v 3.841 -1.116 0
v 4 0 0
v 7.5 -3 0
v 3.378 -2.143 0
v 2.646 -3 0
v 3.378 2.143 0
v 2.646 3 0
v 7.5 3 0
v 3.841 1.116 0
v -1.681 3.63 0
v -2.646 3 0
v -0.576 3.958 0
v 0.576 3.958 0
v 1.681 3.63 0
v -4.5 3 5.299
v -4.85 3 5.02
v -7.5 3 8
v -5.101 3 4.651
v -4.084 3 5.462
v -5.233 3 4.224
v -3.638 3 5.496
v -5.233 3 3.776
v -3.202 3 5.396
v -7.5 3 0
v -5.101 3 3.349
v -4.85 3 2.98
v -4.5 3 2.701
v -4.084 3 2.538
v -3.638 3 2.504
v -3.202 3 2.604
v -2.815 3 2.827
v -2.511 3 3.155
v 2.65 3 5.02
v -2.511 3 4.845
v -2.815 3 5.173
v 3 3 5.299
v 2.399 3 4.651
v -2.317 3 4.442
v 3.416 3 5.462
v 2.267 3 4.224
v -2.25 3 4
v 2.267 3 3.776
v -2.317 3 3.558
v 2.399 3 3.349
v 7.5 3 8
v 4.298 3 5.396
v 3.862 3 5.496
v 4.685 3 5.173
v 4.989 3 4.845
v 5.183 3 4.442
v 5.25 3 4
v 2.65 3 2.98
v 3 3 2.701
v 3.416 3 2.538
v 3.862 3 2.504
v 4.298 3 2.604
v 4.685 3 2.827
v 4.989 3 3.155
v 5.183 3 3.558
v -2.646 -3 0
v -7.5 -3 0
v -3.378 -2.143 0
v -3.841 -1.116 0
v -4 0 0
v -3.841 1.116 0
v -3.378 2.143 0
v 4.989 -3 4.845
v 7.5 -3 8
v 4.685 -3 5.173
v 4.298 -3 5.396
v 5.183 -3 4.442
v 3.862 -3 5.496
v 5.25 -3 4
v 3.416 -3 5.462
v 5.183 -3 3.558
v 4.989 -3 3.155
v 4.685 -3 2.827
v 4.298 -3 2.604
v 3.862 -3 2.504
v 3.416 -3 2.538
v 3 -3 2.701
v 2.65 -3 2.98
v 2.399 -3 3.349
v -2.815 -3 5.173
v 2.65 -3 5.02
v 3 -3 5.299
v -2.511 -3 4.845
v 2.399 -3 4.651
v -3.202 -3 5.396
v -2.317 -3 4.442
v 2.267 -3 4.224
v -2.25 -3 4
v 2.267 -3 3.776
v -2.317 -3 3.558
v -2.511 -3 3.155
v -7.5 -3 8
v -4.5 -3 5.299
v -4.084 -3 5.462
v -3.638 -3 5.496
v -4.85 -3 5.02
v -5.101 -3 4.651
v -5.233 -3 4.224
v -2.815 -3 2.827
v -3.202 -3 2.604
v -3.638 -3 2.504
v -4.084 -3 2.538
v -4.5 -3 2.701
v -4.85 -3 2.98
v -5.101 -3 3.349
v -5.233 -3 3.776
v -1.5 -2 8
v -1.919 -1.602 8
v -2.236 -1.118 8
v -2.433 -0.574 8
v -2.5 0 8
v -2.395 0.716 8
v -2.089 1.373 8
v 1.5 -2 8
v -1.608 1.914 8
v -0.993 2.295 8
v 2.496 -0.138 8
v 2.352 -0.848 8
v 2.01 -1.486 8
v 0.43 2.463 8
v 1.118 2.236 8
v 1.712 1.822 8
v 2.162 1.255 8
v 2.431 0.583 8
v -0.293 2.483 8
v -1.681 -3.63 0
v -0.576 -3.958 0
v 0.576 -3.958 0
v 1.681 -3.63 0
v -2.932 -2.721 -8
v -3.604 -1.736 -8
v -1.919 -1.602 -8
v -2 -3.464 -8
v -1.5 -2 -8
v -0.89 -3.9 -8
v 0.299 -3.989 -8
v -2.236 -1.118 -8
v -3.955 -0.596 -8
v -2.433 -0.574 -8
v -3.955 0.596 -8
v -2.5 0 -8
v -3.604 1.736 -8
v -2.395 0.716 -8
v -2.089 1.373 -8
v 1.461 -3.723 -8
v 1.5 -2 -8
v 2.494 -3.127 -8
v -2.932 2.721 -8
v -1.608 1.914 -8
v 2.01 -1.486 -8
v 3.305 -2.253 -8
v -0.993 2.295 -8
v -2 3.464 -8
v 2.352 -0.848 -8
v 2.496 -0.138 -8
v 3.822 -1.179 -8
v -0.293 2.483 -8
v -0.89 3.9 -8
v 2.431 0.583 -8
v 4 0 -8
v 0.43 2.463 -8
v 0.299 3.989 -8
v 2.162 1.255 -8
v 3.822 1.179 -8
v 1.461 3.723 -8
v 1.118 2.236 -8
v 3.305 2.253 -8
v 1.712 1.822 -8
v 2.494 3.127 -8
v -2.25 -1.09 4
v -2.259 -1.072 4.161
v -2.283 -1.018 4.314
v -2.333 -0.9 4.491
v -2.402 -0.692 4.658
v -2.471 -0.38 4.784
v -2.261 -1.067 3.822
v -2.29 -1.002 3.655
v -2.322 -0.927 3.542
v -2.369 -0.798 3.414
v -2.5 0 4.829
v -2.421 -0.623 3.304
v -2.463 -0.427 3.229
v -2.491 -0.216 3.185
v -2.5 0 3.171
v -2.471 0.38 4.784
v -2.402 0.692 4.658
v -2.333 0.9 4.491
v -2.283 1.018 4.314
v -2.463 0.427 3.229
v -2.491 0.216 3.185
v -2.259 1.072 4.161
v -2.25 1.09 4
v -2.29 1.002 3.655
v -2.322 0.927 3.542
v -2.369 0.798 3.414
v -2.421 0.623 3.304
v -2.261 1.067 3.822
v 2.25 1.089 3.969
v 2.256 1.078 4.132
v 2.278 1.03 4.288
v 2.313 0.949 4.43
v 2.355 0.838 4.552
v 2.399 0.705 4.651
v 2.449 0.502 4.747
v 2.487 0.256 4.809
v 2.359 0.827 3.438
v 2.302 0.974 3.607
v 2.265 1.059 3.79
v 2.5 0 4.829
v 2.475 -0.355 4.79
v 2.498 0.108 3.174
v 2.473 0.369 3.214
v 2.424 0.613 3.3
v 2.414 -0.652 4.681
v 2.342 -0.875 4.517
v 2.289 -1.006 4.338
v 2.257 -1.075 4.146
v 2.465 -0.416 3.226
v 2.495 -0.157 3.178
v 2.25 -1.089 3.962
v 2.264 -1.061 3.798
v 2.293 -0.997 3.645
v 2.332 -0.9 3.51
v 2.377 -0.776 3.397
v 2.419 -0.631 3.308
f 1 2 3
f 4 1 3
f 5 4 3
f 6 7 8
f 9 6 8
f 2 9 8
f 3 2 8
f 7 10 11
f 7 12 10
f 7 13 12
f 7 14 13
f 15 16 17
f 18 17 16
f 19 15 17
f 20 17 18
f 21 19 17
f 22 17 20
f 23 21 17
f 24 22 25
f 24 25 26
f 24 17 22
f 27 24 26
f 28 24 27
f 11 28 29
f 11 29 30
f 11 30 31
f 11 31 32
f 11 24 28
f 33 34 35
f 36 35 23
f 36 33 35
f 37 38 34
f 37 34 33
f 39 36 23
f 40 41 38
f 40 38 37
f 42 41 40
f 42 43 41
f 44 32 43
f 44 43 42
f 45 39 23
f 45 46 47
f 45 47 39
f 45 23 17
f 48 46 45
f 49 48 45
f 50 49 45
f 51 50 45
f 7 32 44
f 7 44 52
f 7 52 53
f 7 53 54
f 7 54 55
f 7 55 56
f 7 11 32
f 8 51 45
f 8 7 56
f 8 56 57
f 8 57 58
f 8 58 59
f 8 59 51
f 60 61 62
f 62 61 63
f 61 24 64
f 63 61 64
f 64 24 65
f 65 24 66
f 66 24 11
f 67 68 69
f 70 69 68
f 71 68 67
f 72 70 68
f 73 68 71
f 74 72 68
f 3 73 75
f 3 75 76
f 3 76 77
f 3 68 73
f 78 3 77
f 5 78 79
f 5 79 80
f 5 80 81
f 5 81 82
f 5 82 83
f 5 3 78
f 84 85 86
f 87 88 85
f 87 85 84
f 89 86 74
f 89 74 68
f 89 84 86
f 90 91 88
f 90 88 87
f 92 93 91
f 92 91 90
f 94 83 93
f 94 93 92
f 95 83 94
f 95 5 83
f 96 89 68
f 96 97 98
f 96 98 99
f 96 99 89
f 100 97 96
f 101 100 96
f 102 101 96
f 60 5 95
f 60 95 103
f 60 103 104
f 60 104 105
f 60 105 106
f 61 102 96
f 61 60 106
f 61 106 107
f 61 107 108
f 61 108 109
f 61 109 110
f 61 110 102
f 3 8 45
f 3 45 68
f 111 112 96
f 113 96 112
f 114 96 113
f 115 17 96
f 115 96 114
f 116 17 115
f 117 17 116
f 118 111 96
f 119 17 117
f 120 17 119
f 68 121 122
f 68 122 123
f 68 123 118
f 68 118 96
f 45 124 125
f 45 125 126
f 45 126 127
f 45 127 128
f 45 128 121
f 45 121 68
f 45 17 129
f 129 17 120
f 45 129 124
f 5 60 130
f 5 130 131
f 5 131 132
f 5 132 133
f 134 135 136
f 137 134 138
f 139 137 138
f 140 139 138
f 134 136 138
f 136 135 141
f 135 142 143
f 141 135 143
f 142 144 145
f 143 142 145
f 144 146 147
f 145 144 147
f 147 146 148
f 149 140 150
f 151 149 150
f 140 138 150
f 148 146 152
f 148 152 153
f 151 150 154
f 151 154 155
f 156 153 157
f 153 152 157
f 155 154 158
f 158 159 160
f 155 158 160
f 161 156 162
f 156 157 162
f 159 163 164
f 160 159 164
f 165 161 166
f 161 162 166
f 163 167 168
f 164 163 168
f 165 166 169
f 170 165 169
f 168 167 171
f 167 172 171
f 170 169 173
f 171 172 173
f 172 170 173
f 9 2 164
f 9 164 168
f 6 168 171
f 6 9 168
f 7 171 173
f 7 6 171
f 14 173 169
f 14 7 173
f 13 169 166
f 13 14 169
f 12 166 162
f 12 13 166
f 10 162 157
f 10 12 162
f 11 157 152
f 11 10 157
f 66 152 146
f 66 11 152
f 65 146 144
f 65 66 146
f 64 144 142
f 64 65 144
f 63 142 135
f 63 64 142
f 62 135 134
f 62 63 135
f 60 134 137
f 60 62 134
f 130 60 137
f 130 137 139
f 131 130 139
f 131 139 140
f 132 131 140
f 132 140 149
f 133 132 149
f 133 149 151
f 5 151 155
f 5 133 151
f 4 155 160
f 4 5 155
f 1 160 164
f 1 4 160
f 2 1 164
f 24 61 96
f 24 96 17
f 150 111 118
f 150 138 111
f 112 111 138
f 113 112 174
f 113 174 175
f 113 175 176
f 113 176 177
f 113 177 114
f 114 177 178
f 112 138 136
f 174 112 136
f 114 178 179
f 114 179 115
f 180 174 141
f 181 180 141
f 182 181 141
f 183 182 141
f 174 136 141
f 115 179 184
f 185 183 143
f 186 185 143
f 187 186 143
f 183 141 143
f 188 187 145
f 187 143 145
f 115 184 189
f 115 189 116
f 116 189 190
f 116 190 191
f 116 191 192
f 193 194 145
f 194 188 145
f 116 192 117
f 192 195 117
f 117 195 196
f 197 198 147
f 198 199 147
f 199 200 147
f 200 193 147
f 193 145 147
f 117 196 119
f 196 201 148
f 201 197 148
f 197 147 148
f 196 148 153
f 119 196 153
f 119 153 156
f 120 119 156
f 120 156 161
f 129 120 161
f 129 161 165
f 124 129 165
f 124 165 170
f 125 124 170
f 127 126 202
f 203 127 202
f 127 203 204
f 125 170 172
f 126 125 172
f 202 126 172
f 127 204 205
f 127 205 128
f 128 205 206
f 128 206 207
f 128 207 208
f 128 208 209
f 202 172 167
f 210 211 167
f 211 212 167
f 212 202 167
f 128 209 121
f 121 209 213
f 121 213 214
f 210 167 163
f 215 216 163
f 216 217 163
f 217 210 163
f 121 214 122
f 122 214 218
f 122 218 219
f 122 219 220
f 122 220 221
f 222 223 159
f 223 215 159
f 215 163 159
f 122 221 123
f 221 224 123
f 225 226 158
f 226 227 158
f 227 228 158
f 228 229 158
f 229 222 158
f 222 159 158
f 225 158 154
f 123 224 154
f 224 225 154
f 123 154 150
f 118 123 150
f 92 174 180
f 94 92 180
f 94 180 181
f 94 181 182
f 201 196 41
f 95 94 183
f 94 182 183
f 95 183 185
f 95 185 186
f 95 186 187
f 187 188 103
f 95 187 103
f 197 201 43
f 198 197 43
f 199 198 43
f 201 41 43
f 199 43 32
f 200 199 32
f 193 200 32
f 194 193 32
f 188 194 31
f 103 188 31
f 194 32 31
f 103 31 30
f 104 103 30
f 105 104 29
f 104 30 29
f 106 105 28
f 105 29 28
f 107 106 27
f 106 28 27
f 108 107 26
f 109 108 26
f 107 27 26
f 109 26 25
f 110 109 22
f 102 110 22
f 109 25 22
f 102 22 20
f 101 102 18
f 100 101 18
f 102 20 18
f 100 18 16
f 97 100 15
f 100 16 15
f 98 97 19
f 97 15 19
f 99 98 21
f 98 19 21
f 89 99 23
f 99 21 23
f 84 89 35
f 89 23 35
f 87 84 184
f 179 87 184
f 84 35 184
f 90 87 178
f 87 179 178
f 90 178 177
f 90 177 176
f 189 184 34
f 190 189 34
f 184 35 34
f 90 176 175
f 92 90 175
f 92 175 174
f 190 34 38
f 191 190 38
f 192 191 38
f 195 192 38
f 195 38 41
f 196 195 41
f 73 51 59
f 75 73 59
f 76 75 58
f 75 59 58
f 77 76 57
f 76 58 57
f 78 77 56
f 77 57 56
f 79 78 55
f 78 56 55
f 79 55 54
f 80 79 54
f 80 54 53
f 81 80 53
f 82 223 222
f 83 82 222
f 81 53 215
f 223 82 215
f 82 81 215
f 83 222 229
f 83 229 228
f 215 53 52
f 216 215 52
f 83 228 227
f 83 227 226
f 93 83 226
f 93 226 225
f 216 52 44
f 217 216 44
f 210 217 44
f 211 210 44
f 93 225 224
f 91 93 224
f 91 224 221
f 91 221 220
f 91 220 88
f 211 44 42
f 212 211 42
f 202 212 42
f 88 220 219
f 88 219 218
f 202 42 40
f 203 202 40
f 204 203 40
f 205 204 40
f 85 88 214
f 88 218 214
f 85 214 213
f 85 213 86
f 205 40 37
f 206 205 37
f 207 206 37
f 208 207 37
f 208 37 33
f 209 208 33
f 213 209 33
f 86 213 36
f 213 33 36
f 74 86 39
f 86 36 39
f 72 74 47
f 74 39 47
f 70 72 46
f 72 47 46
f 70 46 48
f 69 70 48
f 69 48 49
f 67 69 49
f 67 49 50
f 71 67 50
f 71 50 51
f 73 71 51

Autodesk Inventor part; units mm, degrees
ref_plane "YZ Plane" through (0, 0, 0) normal (1, 0, 0) x (0, 1, 0)
ref_plane "XZ Plane" through (0, 0, 0) normal (0, 1, 0) x (-1, 0, 0)
ref_plane "XY Plane" through (0, 0, 0) normal (0, 0, 1) x (1, 0, 0)
sketch "Sketch1" plane through (0, 0, 0) normal (0, 0, 1) x (1, 0, 0)
  line L0 (-7.5, 3) -> (7.5, 3)
  line L1 (7.5, 3) -> (7.5, -3)
  line L2 (7.5, -3) -> (-7.5, -3)
  line L3 (-7.5, -3) -> (-7.5, 3)
  circle A0 centre (0, 0) radius 4
  line L4 (-7.5, 3) -> (7.5, -3) construction
  dimension "d0" = 6
  dimension "d1" = 15
  dimension "d2" = 8
extrude "Extrusion1" add sketch "Sketch1" along normal blind 8 contours L0 A0 L2 L3 | L0 A0 L2 | L0 L1 L2 A0
extrude "Extrusion2" add sketch "Sketch1" against normal blind 8 contours A0 L0 | L0 A0 L2 | L2 A0
sketch "Sketch2" plane through (0, 0, 8) normal (0, 0, 1) x (1, 0, 0)
  circle A0 centre (0, 0) radius 1.5
  dimension "d7" = 3
extrude "Extrusion3" cut sketch "Sketch2" against normal through all
sketch "Sketch3" plane through (-7.5, 3, 8) normal (0, 1, 0) x (1, 0, 0)
  circle A0 centre (3.75, 4) radius 1.5
  circle A1 centre (11.25, 4) radius 1.5
  line L0 (3.75, 4) -> (0, 4)
  line L1 (0, 8) -> (0, 0) projected
  line L2 (3.75, 4) -> (7.5, 4)
  line L3 (7.5, 4) -> (11.25, 4)
  line L4 (11.25, 4) -> (15, 4)
  line L5 (15, 8) -> (15, 0) projected
  point P0 (7.5, 8)
  dimension "d10" = 3
  dimension "d11" = 3
extrude "Extrusion4" cut sketch "Sketch3" against normal through all
sketch "Sketch4" plane through (0, 0, -8) normal (0, 0, -1) x (-1, 0, 0)
  circle A0 centre (0, 0) radius 2.5
  line L0 (1.5, -2) -> (-1.5, -2)
  dimension "d14" = 5
  dimension "d15" = 4.5
extrude "Extrusion5" cut sketch "Sketch4" against normal blind 16.75 contours A0 L0 picked at (0.6276, -0.7851)
properties part number "wierd bearing interface part"
